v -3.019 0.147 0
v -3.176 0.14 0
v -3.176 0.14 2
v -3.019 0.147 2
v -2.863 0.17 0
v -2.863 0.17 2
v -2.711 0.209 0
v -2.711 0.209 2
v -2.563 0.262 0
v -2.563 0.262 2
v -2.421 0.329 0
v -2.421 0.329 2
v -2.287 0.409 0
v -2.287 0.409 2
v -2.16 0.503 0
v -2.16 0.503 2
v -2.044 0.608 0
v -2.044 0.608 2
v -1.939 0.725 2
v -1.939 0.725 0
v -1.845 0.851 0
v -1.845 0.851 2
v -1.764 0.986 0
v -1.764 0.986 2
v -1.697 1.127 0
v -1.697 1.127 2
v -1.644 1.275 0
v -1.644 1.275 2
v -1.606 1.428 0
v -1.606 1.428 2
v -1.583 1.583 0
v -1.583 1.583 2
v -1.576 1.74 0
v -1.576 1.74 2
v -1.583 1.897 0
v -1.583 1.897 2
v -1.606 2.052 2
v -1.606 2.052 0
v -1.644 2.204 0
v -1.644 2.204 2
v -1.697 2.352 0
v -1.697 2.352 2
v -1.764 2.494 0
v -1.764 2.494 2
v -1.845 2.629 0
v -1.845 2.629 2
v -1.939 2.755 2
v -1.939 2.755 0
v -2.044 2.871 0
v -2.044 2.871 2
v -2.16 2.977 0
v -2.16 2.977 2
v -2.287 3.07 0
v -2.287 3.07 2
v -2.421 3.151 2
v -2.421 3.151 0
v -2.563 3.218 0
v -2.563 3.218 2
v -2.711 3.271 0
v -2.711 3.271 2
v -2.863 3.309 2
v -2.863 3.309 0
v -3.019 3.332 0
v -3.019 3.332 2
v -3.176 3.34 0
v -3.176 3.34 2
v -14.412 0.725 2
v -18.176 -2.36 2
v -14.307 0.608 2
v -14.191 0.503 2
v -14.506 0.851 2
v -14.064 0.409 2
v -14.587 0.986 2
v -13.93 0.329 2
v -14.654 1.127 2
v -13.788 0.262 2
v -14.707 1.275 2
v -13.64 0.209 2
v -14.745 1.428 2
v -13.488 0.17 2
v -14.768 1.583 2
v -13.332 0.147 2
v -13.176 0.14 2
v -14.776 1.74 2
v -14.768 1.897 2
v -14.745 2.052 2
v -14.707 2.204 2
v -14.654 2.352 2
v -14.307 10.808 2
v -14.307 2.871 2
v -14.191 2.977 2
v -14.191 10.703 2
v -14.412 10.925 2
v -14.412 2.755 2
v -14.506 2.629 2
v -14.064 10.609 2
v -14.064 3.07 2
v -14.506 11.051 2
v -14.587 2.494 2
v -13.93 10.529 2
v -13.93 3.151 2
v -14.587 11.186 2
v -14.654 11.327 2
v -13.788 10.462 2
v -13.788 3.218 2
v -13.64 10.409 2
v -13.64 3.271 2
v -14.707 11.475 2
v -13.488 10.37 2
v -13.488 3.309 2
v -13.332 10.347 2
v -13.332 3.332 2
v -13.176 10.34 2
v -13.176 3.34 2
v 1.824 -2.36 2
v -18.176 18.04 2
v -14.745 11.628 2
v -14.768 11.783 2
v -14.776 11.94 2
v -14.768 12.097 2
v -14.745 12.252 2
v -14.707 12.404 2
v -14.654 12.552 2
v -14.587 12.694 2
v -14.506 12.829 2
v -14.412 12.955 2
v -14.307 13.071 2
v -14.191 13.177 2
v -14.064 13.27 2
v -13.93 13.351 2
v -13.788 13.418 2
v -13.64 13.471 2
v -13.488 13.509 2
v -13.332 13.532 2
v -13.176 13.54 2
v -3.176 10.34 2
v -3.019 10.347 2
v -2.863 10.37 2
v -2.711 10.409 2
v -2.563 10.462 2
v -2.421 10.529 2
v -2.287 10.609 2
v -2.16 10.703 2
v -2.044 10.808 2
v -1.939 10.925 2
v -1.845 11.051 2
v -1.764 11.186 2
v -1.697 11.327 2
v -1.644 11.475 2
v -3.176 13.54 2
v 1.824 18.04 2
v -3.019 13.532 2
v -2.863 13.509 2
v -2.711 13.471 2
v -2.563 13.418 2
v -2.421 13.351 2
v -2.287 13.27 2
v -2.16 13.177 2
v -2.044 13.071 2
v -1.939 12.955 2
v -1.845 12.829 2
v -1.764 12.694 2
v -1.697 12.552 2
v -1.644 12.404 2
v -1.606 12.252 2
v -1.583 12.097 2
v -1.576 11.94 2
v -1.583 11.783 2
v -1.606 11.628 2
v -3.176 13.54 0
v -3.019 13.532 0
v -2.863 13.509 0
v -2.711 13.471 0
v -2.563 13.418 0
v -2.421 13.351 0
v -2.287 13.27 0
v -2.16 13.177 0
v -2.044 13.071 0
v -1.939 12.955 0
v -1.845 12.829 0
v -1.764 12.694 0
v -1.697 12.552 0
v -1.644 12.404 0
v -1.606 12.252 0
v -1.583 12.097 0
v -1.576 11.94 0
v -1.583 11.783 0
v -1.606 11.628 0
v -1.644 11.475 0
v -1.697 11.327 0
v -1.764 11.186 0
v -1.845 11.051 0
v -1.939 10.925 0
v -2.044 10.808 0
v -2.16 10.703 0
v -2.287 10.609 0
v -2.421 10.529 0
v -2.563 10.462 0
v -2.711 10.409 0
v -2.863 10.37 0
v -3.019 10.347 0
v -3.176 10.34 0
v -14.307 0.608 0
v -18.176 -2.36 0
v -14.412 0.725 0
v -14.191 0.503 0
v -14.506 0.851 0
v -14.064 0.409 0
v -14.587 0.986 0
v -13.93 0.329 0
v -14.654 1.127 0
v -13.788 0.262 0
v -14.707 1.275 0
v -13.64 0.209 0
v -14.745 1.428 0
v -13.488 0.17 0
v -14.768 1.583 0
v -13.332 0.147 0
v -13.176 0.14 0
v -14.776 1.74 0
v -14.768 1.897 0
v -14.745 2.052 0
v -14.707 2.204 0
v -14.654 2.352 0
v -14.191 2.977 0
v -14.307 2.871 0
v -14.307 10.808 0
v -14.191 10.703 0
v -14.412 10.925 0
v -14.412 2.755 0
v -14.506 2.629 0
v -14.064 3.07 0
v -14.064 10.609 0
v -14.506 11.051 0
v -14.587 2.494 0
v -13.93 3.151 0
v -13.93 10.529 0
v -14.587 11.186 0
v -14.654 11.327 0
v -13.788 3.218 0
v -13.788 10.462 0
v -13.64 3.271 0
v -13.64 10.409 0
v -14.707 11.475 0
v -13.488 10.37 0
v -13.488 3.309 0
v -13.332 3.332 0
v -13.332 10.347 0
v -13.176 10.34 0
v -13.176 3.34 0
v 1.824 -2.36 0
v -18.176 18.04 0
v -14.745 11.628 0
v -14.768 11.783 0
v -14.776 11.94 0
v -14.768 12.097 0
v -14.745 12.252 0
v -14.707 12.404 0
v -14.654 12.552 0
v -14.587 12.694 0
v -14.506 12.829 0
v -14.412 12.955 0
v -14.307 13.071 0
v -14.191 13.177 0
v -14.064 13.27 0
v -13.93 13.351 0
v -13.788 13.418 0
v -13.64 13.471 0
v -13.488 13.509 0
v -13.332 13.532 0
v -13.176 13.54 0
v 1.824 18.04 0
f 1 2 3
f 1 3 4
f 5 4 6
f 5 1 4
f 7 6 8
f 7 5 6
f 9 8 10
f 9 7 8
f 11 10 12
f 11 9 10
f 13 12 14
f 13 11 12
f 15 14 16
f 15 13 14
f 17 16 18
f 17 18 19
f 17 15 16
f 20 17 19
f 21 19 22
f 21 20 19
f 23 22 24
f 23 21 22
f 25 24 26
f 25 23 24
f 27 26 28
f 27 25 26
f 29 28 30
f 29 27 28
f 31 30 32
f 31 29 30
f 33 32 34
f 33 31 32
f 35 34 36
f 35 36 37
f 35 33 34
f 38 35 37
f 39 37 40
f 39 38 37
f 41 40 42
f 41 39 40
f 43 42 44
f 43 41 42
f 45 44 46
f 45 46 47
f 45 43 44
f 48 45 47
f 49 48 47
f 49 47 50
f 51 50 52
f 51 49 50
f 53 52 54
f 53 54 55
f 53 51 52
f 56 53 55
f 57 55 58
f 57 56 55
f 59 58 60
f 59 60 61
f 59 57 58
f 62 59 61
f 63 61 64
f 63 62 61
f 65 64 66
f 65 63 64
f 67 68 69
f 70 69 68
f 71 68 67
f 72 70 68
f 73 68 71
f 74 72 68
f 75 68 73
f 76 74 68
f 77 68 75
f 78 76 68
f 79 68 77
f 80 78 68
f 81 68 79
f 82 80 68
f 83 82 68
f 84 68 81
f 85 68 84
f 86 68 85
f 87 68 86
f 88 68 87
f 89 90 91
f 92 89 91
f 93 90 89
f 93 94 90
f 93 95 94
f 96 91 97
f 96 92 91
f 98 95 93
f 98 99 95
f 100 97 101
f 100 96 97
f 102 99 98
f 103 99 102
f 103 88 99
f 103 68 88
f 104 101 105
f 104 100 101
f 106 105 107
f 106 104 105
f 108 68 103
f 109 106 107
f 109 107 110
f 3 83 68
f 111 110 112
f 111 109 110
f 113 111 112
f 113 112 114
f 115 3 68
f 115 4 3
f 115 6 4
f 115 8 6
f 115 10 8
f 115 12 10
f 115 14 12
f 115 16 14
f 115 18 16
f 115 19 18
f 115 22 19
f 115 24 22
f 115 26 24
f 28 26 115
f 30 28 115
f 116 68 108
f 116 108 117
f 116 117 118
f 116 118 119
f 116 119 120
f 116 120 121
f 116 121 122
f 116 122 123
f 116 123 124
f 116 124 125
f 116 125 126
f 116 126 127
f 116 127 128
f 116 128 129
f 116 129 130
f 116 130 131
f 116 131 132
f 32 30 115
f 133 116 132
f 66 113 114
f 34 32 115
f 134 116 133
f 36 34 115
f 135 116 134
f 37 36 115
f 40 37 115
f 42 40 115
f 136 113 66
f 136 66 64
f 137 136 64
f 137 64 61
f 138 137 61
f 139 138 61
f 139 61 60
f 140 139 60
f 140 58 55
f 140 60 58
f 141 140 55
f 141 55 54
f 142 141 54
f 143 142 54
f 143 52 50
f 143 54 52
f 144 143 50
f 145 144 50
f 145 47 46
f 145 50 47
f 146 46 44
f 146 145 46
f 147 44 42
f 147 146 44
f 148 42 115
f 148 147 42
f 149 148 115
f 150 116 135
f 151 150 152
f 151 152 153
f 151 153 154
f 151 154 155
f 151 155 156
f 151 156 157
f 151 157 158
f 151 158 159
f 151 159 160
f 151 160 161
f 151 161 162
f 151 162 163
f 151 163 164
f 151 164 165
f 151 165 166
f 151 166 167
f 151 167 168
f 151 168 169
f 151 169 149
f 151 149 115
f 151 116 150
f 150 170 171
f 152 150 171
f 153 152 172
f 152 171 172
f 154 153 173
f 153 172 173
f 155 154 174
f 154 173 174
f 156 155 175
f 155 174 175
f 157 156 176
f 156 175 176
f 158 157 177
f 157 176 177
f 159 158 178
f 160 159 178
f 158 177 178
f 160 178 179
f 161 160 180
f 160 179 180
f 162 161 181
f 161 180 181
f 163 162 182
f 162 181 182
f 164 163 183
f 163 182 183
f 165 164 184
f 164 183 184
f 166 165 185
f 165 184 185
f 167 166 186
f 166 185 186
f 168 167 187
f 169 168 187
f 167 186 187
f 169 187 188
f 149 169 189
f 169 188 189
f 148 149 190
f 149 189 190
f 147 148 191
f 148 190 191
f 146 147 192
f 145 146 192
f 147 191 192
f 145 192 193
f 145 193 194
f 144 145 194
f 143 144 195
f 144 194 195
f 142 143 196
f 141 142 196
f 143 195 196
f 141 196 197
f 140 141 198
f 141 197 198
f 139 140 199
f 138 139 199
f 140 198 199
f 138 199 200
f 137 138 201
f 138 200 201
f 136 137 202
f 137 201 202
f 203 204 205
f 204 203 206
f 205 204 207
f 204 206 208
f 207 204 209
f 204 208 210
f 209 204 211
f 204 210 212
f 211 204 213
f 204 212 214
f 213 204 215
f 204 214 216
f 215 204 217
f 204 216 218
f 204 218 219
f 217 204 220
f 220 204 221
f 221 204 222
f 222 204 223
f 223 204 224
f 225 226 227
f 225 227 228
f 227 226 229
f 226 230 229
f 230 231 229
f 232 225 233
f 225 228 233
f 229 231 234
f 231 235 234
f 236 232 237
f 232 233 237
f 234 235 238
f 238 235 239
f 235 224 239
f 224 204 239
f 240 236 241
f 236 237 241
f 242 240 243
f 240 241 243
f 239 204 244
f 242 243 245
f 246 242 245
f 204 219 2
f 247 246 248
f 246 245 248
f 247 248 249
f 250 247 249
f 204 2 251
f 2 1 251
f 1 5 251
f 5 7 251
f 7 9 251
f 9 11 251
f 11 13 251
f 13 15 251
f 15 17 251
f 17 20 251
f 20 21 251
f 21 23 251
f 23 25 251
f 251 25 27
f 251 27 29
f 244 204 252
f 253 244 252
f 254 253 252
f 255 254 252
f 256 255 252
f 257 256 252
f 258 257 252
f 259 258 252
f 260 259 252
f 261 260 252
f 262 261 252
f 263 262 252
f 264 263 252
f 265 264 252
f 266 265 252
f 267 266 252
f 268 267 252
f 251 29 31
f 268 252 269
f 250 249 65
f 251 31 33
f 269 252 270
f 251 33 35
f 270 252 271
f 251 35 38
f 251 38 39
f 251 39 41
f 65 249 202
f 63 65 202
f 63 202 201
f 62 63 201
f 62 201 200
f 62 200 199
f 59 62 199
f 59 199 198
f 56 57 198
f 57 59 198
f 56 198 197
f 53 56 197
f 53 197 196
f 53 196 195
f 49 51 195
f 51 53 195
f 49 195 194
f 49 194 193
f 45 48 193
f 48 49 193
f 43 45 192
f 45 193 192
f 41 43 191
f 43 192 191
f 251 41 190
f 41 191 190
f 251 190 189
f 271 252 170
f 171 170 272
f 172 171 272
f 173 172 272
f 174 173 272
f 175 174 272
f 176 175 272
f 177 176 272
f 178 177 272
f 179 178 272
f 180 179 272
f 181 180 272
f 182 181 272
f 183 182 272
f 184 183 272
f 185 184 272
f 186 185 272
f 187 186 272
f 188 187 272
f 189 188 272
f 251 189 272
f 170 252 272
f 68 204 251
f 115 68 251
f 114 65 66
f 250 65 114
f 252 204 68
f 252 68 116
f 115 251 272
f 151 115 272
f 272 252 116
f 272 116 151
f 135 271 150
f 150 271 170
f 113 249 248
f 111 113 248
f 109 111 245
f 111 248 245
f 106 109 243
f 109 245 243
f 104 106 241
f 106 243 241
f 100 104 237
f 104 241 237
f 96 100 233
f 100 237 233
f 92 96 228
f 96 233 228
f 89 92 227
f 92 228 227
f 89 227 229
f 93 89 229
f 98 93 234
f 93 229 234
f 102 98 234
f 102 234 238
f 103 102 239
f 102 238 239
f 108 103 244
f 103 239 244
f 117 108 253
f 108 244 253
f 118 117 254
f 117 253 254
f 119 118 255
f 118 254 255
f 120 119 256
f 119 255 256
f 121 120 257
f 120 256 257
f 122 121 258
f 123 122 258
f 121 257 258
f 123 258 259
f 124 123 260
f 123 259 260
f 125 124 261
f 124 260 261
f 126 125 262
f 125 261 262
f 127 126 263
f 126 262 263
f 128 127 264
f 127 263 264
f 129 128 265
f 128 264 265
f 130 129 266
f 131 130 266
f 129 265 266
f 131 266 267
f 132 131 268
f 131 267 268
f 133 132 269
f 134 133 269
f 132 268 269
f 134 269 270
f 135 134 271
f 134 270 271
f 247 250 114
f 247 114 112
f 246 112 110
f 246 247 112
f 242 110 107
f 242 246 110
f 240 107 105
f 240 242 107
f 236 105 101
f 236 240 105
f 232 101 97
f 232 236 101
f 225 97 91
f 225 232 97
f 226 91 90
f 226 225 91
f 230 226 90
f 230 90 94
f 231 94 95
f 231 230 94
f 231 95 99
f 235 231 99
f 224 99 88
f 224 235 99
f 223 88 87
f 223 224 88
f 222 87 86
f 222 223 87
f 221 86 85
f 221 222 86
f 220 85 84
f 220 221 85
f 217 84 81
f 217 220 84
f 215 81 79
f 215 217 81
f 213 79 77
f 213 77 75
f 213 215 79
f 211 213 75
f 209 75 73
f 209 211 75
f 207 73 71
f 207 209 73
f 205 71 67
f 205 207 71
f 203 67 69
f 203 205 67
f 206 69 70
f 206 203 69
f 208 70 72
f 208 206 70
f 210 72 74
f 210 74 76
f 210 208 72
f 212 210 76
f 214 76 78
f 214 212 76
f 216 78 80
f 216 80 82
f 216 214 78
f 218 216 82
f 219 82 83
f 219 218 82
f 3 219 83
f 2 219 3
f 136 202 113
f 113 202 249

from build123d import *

# Parameters (mm, degrees)
SKETCH_1_W      = 20
SKETCH_1_H      = 20.4
EXTRUDE_1_DEPTH = 2


with BuildPart() as part:
    # 草图1 → 凸台-拉伸1 (new body)
    with BuildSketch(Plane.XY):
        with Locations((-8.175518001, 7.839742025)):
            Rectangle(SKETCH_1_W, SKETCH_1_H)
        with BuildLine():
            Line((-13.175518001, 13.539742025), (-3.175518001, 13.539742025))
            ThreePointArc((-3.175518001, 13.539742025), (-1.575518001, 11.939742025), (-3.175518001, 10.339742025))
            Line((-3.175518001, 10.339742025), (-13.175518001, 10.339742025))
            ThreePointArc((-13.175518001, 10.339742025), (-14.775518001, 11.939742025), (-13.175518001, 13.539742025))
        make_face(mode=Mode.SUBTRACT)
        with BuildLine():
            Line((-13.175518001, 0.139742025), (-3.175518001, 0.139742025))
            ThreePointArc((-3.175518001, 0.139742025), (-1.575518001, 1.739742025), (-3.175518001, 3.339742025))
            Line((-3.175518001, 3.339742025), (-13.175518001, 3.339742025))
            ThreePointArc((-13.175518001, 3.339742025), (-14.775518001, 1.739742025), (-13.175518001, 0.139742025))
        make_face(mode=Mode.SUBTRACT)
    extrude(amount=EXTRUDE_1_DEPTH)


solid = part.part
